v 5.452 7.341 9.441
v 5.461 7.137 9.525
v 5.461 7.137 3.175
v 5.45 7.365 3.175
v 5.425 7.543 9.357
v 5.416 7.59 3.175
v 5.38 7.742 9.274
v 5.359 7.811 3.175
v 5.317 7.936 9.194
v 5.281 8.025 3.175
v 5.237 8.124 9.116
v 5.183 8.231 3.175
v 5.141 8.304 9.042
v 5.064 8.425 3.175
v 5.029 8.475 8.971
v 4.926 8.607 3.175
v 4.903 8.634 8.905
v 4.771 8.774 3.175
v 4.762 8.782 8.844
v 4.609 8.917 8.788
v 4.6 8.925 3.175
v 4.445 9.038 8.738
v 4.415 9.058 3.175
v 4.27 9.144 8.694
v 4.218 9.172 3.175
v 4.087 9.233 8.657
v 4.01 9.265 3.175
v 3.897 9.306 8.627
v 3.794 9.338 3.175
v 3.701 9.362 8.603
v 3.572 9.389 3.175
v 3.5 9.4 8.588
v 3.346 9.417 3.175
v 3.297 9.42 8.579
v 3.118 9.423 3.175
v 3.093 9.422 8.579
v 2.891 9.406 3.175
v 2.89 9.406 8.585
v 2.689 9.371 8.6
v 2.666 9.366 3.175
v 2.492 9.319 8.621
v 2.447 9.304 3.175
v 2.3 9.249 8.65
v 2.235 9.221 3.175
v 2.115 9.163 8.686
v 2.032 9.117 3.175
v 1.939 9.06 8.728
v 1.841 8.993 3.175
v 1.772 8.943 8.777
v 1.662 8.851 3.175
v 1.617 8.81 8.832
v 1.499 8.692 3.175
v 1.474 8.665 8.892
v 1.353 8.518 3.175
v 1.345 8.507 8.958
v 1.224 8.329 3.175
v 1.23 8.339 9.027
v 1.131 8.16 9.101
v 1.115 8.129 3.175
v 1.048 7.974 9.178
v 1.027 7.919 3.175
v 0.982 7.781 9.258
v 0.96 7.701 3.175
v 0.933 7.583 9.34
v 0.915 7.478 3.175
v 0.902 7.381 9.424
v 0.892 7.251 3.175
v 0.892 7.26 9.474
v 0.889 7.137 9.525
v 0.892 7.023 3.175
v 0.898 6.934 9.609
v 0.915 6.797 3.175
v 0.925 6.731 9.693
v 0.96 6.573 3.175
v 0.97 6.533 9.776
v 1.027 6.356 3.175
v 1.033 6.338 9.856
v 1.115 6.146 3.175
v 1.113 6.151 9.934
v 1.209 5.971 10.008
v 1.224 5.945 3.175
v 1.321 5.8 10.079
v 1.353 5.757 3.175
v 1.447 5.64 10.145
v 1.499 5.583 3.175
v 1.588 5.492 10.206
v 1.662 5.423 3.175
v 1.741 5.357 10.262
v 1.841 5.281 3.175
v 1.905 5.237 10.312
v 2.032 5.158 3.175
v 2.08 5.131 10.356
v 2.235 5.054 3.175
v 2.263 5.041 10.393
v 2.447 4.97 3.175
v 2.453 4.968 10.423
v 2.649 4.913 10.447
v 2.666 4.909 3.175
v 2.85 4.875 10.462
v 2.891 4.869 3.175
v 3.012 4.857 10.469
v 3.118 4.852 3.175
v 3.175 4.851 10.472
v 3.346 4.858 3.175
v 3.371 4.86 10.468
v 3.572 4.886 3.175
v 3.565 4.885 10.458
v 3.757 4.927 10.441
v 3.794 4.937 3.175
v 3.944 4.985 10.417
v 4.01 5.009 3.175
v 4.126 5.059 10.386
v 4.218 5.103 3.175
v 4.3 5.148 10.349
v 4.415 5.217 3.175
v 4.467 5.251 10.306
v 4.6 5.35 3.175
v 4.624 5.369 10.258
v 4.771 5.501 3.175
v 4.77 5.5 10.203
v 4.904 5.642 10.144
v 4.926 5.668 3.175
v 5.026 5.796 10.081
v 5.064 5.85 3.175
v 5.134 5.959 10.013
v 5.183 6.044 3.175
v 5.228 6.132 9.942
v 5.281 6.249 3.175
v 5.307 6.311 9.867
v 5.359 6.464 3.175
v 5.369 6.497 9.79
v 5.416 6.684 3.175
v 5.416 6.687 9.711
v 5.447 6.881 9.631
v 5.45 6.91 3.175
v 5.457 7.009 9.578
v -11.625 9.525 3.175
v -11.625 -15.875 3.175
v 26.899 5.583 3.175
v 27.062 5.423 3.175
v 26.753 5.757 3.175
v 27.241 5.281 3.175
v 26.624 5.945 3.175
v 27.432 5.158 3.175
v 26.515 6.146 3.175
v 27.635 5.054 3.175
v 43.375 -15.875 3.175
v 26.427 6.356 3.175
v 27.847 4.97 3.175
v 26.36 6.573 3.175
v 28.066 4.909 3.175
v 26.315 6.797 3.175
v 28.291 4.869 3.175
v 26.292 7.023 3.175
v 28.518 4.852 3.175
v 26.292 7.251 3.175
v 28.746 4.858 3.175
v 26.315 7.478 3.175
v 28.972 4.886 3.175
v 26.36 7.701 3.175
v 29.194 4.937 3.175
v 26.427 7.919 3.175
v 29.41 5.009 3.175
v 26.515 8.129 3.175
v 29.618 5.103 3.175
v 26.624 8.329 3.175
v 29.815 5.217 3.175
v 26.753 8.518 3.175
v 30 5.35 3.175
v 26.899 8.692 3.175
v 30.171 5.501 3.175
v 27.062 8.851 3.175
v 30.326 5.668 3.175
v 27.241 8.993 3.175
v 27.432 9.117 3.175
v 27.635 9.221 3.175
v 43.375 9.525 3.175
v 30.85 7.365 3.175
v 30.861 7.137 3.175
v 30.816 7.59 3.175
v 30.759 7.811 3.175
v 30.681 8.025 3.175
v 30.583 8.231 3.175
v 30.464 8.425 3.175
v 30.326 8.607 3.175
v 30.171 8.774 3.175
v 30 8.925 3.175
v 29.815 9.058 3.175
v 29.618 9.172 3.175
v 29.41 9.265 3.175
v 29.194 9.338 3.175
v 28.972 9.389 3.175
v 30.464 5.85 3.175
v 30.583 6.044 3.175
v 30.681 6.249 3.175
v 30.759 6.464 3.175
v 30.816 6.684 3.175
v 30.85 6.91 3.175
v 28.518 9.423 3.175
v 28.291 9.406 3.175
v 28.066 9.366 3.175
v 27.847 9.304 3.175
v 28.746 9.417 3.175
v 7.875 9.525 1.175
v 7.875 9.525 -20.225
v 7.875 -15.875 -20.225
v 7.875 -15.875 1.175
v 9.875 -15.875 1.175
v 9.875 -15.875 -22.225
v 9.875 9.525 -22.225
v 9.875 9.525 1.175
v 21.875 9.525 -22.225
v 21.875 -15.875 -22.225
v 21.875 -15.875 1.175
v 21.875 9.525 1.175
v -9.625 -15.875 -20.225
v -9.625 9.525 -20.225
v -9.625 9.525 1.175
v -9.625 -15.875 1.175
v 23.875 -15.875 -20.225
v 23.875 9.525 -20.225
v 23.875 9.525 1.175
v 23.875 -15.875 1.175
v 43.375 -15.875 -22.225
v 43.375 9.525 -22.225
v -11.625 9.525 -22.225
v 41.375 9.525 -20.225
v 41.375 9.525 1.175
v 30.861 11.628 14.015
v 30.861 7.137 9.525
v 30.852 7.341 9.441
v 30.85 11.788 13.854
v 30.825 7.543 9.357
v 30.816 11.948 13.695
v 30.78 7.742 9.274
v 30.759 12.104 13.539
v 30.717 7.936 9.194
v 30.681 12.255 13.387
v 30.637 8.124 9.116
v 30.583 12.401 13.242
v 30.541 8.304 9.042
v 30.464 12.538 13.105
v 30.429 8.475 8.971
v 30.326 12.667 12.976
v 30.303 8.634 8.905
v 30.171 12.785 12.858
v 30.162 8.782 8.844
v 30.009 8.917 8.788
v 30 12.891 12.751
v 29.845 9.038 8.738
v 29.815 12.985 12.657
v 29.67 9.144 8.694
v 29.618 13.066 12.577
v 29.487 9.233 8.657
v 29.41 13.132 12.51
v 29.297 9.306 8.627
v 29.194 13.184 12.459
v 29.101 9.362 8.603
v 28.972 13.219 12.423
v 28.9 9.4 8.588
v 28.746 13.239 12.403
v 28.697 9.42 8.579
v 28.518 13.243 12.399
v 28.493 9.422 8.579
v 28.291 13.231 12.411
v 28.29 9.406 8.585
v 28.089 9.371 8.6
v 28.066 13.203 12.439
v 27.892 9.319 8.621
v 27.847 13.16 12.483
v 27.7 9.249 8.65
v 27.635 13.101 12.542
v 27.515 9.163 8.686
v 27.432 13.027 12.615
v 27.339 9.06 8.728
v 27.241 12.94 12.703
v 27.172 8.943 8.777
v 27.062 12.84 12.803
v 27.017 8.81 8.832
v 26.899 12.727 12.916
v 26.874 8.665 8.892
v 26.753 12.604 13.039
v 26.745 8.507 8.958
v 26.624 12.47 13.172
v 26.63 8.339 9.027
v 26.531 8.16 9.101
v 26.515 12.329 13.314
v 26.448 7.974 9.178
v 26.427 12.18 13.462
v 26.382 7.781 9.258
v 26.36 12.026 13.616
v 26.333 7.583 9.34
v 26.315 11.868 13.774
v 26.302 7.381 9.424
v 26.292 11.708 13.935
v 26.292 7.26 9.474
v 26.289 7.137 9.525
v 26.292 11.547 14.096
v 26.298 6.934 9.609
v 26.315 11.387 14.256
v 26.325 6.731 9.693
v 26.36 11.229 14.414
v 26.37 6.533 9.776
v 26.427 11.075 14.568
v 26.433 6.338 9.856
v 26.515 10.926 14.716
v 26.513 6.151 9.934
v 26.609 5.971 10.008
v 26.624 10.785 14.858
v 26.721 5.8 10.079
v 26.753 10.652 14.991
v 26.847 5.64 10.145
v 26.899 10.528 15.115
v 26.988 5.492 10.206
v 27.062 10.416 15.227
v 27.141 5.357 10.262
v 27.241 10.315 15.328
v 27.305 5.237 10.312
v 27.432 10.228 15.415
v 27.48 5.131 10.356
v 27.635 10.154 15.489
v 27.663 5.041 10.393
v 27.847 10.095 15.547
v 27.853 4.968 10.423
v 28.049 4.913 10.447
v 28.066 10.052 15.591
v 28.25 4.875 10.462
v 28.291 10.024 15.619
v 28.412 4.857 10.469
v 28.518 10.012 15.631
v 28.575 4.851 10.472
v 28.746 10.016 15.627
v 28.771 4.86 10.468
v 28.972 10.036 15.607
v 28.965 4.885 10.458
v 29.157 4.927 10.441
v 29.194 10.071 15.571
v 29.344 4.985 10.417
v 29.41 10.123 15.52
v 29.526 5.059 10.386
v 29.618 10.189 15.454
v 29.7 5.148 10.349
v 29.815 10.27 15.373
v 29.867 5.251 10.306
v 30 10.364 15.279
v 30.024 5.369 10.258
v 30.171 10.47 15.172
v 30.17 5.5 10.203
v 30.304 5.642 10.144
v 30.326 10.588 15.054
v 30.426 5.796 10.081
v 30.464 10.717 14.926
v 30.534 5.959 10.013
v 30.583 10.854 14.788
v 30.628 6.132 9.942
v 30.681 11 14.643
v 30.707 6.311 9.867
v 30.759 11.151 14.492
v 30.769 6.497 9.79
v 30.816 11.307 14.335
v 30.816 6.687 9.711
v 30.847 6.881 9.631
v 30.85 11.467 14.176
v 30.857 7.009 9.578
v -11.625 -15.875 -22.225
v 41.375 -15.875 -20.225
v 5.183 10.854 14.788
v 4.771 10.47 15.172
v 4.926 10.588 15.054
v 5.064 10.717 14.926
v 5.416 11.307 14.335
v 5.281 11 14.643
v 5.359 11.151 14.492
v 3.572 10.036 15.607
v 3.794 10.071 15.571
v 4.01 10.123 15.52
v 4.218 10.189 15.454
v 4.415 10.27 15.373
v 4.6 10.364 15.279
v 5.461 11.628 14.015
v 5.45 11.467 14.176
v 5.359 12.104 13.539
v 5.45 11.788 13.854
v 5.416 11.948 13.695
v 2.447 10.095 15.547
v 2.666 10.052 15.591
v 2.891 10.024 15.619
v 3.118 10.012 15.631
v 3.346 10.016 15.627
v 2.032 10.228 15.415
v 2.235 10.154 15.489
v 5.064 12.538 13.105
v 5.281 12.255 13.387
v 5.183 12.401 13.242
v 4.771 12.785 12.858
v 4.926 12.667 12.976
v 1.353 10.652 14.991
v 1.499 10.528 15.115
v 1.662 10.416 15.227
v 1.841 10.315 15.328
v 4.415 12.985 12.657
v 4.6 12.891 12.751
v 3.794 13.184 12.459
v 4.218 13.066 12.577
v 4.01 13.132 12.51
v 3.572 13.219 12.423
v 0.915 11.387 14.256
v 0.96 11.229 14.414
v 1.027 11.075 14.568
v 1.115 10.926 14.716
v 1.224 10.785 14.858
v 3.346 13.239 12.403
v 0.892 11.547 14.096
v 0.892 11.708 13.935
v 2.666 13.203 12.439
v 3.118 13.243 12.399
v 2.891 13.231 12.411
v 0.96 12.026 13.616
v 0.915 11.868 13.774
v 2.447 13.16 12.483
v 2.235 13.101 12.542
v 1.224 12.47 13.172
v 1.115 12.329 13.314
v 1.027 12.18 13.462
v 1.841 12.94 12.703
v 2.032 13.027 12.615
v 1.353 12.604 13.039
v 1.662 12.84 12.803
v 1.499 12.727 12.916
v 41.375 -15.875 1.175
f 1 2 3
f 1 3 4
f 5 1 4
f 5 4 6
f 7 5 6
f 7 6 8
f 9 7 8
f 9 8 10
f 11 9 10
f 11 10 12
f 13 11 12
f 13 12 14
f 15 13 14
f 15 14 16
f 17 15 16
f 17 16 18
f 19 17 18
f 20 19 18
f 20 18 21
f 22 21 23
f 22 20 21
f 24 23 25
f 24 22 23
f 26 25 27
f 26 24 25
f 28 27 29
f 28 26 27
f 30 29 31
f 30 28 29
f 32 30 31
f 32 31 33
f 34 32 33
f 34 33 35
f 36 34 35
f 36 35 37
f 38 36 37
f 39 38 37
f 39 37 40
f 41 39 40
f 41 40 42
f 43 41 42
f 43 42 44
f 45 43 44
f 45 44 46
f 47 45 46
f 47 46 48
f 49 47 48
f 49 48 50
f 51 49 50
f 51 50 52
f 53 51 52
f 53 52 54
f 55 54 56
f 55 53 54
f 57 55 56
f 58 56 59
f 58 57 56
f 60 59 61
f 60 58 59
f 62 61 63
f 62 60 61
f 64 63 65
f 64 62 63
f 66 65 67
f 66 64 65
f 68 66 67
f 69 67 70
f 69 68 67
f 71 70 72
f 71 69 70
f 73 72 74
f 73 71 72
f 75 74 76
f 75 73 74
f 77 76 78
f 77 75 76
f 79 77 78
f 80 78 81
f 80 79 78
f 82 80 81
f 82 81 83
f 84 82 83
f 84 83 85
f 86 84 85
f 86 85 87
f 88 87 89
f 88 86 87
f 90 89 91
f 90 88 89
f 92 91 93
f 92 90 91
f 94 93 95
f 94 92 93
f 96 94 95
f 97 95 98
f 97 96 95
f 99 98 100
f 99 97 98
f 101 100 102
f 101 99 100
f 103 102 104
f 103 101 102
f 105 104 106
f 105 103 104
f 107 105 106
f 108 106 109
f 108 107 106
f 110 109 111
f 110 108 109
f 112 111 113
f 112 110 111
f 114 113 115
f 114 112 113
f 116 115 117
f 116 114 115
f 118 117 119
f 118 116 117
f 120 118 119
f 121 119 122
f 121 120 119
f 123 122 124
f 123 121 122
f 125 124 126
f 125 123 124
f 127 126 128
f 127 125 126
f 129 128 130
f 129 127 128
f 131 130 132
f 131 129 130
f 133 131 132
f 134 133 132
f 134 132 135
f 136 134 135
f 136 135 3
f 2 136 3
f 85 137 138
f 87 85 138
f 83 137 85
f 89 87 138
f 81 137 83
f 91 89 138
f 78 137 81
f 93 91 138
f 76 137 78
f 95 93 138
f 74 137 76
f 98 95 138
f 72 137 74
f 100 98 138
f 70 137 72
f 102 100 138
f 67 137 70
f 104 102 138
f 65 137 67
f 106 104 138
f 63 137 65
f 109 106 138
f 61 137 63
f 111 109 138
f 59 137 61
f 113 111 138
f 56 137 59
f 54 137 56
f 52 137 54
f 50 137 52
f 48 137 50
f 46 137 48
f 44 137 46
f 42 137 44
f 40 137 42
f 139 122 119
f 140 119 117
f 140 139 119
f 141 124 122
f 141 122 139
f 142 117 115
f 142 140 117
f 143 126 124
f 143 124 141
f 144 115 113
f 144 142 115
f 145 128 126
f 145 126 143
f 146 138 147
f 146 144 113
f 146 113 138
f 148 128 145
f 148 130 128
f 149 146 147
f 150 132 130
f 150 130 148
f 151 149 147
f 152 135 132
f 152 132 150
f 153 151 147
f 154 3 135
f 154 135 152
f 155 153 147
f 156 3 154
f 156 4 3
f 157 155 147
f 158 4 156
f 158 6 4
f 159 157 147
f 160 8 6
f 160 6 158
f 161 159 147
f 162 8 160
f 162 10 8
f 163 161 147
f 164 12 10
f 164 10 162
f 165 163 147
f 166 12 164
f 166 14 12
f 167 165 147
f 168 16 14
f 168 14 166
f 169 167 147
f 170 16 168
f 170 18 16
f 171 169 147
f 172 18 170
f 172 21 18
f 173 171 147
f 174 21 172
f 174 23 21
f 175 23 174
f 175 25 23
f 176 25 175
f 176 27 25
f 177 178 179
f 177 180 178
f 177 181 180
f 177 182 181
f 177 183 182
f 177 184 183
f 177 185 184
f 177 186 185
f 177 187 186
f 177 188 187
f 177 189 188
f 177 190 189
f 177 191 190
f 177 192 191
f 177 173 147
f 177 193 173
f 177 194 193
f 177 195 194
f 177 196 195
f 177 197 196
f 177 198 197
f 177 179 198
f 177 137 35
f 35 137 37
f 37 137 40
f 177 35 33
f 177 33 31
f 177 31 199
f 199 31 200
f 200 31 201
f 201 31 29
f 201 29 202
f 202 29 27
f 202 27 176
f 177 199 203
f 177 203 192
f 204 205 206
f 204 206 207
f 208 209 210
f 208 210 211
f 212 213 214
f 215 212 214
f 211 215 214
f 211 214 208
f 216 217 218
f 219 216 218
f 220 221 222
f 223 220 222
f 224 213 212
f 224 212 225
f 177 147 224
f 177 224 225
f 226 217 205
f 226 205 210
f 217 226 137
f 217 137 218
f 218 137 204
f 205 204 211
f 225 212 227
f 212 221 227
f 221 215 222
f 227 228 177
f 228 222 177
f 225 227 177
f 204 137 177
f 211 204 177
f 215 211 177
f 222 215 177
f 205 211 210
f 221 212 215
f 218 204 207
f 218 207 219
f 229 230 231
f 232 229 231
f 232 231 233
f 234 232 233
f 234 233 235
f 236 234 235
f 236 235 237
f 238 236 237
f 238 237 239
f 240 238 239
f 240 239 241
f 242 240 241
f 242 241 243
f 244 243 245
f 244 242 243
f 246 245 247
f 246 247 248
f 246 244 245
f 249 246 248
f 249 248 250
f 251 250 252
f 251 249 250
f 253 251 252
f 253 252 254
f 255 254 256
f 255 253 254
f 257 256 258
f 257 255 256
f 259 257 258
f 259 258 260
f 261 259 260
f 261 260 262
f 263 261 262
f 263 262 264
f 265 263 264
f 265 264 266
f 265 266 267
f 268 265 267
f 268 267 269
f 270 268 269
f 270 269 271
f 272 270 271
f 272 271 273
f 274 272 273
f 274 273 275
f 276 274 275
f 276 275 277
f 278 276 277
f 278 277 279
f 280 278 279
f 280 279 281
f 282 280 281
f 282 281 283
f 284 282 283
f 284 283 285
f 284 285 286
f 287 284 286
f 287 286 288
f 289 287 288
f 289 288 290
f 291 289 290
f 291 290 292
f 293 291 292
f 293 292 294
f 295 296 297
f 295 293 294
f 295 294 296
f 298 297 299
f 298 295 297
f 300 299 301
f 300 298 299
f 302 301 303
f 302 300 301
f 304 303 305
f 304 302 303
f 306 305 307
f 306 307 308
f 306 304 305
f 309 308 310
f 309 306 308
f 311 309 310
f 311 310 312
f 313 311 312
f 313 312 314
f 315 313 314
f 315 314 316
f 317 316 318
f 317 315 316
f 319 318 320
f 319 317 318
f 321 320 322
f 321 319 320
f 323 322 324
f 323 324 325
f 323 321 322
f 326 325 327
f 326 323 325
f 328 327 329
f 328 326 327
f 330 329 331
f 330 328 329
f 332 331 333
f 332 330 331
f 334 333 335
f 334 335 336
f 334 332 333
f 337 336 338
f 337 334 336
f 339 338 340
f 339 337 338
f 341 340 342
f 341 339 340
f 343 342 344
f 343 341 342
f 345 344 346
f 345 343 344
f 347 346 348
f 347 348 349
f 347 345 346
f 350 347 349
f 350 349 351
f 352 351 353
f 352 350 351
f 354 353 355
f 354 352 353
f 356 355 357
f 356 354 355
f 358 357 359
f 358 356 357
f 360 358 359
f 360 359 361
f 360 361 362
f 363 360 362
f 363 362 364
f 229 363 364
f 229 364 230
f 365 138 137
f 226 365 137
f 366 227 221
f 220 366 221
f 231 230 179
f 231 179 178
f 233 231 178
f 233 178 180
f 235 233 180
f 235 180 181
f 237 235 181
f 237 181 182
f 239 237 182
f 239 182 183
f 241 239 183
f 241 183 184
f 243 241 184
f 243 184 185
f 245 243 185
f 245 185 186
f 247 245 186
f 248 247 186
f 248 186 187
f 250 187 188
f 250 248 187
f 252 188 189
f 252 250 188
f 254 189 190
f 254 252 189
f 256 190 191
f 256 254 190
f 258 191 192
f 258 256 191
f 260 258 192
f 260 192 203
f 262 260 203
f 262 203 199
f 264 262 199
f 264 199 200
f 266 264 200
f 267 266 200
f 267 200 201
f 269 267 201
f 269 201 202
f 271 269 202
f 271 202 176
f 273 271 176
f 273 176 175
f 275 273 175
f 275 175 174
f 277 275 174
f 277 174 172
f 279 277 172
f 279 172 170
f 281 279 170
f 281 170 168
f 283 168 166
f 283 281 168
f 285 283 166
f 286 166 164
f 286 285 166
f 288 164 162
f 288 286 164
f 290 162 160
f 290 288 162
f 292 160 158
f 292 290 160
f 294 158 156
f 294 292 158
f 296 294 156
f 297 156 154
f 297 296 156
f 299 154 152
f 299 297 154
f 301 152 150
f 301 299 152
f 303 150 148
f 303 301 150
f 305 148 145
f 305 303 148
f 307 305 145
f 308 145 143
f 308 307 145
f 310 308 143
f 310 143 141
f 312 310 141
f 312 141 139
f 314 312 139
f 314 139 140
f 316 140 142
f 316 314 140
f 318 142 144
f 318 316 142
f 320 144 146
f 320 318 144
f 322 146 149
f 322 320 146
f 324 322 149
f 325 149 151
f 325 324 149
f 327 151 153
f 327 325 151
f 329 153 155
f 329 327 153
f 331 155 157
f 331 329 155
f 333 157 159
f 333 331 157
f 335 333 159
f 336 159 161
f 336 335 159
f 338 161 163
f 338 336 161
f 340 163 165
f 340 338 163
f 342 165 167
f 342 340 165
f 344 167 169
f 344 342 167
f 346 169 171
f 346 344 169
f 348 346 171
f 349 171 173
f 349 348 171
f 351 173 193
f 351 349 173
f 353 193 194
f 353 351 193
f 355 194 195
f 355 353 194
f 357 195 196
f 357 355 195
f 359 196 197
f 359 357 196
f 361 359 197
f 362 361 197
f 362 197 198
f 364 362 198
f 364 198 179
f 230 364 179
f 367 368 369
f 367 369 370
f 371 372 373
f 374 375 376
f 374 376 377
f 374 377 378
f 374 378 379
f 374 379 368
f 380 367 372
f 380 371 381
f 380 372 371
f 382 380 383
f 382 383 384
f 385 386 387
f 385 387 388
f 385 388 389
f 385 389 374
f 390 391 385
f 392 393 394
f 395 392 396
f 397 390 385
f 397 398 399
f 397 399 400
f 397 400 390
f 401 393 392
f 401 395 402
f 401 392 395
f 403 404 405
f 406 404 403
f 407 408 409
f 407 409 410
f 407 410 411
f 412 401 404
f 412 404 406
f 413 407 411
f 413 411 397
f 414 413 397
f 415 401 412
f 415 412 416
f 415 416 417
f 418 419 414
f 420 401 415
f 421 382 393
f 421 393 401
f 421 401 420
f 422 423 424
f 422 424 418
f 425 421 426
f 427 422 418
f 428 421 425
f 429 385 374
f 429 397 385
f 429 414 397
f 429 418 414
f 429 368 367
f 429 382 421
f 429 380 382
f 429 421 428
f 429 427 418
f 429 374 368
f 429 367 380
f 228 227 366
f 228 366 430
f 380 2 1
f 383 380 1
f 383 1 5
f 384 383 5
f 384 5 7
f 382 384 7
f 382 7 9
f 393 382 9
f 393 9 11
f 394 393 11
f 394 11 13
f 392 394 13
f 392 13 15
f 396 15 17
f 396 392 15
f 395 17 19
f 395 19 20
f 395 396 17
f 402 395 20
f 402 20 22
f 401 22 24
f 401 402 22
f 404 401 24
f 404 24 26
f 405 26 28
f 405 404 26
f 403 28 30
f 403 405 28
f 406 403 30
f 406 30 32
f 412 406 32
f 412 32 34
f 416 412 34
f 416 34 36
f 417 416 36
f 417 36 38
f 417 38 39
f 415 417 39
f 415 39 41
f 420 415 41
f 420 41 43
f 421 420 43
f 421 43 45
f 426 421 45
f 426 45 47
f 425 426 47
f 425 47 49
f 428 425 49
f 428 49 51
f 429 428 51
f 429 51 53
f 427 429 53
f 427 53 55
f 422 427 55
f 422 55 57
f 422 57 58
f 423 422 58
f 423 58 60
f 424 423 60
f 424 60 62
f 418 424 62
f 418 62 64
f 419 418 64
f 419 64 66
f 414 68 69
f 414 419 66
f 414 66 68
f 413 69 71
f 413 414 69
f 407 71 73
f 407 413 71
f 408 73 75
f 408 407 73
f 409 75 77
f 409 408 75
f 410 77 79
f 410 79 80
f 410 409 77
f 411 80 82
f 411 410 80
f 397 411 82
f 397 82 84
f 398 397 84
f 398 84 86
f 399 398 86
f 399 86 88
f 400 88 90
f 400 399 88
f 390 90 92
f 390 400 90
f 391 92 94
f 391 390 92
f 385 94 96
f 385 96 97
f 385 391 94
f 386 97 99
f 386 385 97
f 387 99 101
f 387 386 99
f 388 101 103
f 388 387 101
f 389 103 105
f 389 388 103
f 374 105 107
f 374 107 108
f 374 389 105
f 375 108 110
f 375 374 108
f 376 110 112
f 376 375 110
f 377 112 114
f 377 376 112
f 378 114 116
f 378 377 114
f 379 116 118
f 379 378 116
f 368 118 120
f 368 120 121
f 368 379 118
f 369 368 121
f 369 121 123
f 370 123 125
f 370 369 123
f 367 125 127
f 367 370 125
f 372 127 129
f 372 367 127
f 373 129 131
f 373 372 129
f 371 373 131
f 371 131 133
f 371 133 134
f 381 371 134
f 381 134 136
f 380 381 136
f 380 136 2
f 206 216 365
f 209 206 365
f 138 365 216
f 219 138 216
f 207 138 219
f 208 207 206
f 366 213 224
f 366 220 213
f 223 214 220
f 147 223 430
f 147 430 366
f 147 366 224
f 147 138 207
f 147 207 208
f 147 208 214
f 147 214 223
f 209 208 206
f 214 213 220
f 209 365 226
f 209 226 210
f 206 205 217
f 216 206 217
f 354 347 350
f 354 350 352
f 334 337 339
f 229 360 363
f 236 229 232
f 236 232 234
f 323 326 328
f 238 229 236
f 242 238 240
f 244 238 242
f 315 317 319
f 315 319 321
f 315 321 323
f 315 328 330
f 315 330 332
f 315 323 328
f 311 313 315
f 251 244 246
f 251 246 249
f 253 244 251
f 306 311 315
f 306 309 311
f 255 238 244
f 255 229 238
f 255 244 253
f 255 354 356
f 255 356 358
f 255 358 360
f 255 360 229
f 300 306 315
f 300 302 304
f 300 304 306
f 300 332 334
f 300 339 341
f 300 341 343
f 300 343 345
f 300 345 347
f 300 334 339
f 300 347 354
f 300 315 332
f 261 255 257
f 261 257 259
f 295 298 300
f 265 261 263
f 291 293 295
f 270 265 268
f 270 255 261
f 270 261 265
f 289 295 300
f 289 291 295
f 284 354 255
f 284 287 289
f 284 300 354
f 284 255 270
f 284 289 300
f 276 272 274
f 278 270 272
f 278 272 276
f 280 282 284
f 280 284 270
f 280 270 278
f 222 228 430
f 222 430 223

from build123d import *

# Parameters (mm, degrees)
F0_W      = 31.75
F0_H      = 9.525
F1_DEPTH  = 3.175
F4_R      = 2.286
F8_R      = 2.286
F10_W     = 55
F10_H     = 25.4
F11_DEPTH = 25.4
F12_W     = 17.5
F12_H     = 21.4
F12_W_2   = 12
F12_H_2   = 23.4
F13_DEPTH = 25.401


with BuildPart() as f1:
    # F0 (on Top) → F1 (new body)
    with BuildSketch(Plane.XY):
        with Locations((15.875, 4.7625)):
            Rectangle(F0_W, F0_H)
    extrude(amount=F1_DEPTH)

    # F5: sweep along a path in F3
    with BuildLine(Plane.YZ.offset(28.575)) as f5_path:
        Line((7.1374, 3.175), (7.1374, 9.525))
        Line((7.1374, 9.525), (11.6275280605, 14.0151280605))
    # F4 (on face) → F5 (sweep)
    with BuildSketch(Plane.XY.offset(3.175)):
        with Locations((28.575, 7.1374)):
            Circle(F4_R)
    sweep(path=f5_path.line, transition=Transition.RIGHT)

    # F9: sweep along a path in F7
    with BuildLine(Plane.YZ.offset(3.175)) as f9_path:
        Line((7.1374, 3.175), (7.1374, 9.525))
        Line((7.1374, 9.525), (11.6275280605, 14.0151280605))
    # F8 (on face) → F9 (sweep)
    with BuildSketch(Plane.XY.offset(3.175)):
        with Locations((3.175, 7.1374)):
            Circle(F8_R)
    sweep(path=f9_path.line, transition=Transition.RIGHT)

    # F10 (on face) → F11 (join)
    with BuildSketch(Plane.XY.offset(3.175)):
        with Locations((15.875, -3.175)):
            Rectangle(F10_W, F10_H)
    extrude(amount=-F11_DEPTH)

    # F12 (on face) → F13 (cut, through all)
    with BuildSketch(Plane(origin=(0, 9.525, 0), x_dir=(-1, 0, 0), z_dir=(0, 1, 0))):
        with Locations((-32.625, -9.525)):
            Rectangle(F12_W, F12_H)
        with Locations((-15.875, -10.525)):
            Rectangle(F12_W_2, F12_H_2)
        with Locations((0.875, -9.525)):
            Rectangle(F12_W, F12_H)
    extrude(amount=-F13_DEPTH, mode=Mode.SUBTRACT)


solid = f1.part
